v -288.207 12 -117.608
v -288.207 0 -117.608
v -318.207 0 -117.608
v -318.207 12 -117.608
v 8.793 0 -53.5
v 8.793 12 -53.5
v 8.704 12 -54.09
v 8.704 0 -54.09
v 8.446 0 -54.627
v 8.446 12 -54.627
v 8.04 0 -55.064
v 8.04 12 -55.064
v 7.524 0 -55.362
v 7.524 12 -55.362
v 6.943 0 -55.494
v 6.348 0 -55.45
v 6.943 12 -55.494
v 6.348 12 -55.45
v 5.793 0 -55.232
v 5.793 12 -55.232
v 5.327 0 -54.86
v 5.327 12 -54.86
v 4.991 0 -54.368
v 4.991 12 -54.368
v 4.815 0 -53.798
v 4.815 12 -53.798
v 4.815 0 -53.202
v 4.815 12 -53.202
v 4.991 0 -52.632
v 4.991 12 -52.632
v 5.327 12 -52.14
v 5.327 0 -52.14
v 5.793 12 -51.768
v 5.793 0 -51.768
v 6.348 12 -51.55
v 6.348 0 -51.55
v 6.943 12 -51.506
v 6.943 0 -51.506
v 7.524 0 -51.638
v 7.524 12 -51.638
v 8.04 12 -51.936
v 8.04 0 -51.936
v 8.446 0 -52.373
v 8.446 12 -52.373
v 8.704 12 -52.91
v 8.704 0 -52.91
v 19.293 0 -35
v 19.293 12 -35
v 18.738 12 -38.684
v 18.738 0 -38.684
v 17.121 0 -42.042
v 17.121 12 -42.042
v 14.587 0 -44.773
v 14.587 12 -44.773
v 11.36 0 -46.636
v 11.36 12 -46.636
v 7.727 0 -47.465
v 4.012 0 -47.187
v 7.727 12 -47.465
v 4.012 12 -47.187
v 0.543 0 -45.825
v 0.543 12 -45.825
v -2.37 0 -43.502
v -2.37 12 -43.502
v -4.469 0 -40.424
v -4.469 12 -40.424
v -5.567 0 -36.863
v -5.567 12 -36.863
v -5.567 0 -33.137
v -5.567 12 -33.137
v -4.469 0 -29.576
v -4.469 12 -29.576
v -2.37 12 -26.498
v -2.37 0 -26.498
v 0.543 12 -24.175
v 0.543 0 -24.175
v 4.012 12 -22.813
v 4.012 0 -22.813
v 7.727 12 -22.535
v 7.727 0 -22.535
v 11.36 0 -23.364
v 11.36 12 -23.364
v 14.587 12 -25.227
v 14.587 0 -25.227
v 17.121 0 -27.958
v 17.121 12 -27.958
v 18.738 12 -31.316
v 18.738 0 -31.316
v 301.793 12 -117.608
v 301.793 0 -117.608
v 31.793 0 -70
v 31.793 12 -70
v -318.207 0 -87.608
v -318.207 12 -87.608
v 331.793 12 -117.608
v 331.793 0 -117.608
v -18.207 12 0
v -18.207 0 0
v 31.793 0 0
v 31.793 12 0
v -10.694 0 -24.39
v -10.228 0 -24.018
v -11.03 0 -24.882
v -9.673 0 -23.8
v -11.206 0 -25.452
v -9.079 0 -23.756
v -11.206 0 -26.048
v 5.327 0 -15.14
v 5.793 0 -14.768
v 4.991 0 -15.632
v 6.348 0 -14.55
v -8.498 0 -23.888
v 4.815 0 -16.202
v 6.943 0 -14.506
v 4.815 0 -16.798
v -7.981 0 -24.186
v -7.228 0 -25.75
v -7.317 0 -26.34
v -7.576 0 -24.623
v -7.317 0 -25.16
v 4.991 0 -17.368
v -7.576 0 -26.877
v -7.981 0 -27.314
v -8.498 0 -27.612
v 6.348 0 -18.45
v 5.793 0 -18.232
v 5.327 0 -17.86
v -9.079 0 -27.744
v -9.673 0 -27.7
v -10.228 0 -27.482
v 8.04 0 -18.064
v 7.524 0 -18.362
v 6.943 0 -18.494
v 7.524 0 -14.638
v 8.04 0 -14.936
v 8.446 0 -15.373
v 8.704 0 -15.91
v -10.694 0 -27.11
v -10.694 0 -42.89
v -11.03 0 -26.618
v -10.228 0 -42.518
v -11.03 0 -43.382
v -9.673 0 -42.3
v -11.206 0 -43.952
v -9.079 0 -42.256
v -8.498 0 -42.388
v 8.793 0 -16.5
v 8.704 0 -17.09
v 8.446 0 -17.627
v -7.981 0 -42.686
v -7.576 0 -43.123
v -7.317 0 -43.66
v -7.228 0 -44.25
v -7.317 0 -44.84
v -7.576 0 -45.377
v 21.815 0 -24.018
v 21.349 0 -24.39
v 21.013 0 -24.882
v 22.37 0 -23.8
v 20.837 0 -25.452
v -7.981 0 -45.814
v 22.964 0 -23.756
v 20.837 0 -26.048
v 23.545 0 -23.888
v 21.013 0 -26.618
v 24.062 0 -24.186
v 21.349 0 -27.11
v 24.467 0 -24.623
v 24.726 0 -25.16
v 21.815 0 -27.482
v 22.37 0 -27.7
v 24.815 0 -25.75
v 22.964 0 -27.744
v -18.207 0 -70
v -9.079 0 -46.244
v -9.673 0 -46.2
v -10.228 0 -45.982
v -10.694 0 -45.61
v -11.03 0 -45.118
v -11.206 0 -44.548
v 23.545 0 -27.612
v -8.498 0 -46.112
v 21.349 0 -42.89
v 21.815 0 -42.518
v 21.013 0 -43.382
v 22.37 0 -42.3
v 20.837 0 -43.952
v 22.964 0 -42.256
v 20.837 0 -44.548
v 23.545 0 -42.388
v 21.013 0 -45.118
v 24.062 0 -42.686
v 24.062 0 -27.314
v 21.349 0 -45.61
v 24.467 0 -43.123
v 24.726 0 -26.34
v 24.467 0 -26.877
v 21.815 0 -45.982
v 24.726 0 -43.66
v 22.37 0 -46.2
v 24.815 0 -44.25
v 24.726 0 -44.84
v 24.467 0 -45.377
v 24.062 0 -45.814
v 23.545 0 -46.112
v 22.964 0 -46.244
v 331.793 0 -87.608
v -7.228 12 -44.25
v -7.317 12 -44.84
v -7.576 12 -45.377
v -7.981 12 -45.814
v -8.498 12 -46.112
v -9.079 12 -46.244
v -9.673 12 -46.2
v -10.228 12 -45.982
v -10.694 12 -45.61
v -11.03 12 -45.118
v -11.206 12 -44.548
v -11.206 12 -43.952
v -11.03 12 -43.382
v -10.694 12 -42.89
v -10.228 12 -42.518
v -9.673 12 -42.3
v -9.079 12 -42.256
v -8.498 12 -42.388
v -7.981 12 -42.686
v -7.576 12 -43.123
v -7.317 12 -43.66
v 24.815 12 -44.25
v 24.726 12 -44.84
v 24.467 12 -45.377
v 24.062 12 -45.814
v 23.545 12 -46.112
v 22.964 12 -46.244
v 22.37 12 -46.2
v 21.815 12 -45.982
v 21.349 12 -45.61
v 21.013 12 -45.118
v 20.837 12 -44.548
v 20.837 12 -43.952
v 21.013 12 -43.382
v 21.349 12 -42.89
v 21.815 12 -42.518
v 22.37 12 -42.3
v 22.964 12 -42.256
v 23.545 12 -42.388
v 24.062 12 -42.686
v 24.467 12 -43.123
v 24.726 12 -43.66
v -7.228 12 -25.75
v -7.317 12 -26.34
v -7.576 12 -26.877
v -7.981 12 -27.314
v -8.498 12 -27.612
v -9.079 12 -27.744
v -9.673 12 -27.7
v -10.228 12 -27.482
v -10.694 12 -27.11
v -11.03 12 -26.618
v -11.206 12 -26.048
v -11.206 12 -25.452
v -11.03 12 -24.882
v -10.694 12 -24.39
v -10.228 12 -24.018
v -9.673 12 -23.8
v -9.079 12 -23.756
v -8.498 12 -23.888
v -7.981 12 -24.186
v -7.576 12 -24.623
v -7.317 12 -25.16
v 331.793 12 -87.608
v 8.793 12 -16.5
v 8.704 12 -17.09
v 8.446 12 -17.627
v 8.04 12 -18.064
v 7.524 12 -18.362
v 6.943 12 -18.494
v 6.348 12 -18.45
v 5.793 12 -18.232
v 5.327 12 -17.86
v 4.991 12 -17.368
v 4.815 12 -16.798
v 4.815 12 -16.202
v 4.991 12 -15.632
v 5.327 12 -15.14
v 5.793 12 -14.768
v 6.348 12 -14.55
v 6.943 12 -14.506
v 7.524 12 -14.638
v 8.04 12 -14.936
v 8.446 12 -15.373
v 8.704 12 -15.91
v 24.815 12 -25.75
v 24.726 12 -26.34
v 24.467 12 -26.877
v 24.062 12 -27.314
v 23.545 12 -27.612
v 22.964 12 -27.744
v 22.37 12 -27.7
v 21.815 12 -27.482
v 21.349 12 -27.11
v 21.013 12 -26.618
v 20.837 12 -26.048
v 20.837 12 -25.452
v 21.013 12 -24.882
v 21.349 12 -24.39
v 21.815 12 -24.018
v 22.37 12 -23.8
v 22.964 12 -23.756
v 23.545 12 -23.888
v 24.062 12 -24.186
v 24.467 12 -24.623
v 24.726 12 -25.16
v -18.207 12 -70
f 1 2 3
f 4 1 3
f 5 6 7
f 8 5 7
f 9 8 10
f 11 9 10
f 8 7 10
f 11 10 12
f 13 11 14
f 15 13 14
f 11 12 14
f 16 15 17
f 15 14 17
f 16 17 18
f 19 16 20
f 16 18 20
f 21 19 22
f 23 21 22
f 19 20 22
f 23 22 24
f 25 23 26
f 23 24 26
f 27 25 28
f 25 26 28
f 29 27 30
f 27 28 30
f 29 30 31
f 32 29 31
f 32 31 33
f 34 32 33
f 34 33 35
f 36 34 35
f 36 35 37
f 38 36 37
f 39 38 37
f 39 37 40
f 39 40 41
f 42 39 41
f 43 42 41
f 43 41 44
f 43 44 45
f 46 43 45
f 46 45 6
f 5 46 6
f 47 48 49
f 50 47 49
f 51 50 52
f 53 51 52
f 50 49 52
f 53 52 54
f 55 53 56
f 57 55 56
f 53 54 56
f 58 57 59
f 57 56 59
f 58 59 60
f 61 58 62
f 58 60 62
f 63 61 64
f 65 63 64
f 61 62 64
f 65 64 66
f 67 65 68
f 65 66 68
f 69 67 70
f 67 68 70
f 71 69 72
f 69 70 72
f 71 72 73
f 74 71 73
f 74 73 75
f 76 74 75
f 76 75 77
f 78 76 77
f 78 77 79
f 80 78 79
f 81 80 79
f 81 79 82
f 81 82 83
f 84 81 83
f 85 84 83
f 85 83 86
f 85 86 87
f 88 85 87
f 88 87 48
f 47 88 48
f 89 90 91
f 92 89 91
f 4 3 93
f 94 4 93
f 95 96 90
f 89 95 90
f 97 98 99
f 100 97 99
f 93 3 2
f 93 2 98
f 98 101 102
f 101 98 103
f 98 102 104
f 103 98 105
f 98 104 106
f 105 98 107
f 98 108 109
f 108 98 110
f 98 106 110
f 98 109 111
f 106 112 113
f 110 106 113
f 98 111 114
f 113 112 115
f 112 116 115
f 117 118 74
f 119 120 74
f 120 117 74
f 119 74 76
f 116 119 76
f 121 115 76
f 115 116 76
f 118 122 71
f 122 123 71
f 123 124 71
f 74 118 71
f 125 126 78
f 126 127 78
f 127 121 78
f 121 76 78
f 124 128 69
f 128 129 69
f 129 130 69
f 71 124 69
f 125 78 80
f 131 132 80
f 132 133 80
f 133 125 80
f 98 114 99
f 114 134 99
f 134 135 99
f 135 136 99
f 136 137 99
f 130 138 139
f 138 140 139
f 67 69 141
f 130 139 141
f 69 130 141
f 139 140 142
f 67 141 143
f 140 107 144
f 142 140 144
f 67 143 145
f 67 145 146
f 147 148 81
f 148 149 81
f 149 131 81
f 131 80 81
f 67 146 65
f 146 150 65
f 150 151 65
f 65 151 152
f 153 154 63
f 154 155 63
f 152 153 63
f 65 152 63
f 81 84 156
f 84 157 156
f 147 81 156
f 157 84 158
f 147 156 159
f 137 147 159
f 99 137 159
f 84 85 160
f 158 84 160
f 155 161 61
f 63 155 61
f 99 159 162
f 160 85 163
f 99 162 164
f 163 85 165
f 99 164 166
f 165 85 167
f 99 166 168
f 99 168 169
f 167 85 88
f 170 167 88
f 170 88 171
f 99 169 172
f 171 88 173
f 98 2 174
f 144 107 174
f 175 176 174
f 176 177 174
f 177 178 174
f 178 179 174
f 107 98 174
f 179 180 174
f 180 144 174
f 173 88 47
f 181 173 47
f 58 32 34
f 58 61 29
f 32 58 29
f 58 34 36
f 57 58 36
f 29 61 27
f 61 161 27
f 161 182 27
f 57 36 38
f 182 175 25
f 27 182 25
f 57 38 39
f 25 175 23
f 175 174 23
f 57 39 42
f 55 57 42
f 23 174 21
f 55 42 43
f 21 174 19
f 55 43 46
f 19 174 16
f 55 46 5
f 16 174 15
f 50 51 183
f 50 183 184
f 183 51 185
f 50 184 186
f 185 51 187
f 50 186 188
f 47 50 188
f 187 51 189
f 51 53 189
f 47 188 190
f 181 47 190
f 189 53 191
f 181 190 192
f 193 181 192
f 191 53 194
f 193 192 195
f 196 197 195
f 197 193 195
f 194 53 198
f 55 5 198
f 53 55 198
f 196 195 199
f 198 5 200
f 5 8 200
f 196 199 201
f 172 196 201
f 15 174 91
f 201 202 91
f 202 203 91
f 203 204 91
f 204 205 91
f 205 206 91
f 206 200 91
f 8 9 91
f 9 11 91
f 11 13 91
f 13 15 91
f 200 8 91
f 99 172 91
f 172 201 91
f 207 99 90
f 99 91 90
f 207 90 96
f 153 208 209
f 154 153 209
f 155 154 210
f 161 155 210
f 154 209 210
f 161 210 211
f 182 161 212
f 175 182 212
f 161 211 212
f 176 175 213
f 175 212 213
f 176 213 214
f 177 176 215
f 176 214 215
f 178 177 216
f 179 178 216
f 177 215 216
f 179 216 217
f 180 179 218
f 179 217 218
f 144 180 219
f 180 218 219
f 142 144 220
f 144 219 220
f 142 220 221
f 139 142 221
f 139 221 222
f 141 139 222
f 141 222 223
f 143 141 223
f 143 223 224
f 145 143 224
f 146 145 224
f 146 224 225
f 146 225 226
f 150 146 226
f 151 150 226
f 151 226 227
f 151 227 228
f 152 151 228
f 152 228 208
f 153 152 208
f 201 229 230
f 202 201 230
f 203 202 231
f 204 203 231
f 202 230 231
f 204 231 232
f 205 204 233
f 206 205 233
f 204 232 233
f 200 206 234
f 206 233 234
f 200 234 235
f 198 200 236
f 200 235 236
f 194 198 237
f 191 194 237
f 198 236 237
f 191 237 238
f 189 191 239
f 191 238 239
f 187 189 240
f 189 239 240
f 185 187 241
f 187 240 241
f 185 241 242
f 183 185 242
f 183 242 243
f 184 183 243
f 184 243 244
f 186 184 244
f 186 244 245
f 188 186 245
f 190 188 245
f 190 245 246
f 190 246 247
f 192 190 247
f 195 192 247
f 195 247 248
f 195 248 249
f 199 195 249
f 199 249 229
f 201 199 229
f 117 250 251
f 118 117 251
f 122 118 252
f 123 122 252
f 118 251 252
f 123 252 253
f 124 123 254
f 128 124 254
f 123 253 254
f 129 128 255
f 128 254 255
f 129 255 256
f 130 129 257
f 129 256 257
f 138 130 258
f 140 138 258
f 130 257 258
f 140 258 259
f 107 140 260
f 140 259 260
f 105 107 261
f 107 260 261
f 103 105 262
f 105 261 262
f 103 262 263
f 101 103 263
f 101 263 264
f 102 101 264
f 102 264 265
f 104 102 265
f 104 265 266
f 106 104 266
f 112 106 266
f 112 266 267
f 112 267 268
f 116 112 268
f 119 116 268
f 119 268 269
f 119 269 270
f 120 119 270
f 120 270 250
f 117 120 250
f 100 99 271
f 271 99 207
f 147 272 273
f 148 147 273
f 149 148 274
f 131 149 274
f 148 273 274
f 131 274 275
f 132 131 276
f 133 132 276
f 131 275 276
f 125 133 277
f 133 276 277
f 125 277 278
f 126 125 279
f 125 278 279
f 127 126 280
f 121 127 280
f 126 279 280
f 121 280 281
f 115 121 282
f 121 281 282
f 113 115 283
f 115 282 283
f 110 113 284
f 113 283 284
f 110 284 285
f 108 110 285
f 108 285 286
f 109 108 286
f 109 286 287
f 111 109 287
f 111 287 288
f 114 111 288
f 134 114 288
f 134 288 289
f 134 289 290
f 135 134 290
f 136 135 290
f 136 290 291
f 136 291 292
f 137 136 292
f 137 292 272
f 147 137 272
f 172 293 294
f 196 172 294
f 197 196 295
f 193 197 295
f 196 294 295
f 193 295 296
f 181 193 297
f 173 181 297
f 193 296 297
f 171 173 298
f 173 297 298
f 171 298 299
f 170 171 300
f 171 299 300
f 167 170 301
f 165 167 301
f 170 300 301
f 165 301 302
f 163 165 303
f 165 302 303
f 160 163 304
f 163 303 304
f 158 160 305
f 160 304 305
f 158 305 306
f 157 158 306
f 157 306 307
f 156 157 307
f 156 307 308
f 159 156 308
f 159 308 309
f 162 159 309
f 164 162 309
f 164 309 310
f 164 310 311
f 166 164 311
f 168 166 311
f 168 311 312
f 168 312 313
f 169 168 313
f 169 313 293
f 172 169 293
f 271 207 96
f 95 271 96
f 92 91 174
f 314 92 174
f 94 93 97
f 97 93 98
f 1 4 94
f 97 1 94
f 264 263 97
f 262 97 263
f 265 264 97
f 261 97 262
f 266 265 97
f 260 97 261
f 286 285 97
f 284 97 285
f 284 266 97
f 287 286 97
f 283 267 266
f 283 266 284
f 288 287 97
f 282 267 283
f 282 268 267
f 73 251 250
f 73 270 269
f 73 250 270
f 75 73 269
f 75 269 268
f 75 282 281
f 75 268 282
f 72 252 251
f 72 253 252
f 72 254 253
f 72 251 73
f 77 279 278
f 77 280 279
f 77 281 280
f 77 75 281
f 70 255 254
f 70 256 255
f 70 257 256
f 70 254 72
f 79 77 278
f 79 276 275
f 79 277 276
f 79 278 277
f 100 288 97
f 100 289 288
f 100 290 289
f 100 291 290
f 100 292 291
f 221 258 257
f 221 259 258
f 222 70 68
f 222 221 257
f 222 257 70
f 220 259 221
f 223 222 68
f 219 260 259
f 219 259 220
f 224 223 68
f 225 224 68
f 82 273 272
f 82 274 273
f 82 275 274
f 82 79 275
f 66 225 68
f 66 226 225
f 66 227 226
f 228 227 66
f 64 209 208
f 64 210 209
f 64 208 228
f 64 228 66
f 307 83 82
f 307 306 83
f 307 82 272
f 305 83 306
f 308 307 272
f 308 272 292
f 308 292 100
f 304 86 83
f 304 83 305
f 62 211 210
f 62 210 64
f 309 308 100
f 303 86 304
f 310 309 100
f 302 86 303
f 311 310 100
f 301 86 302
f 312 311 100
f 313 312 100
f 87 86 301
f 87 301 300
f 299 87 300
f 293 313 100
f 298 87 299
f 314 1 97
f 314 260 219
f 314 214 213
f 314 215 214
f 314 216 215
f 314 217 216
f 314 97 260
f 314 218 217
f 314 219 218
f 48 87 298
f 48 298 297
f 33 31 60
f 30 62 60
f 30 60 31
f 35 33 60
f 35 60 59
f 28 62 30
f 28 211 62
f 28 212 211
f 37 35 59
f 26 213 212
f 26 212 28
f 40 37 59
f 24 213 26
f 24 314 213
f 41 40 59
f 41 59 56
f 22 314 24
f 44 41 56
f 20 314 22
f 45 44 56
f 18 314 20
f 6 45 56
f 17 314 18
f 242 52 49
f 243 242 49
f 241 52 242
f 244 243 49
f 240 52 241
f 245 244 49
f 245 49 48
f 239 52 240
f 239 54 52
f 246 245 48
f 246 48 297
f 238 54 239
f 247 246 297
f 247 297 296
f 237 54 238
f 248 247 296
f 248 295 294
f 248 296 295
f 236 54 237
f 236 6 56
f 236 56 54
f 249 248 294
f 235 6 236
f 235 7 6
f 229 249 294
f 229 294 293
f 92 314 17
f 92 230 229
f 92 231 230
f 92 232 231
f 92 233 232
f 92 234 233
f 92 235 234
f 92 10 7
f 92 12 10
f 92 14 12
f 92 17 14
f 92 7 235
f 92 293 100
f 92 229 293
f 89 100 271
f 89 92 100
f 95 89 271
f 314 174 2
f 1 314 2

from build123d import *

# Parameters (mm, degrees)
BOSS_EXTRUDE1_DEPTH = 12
SKETCH4_R           = 12.5
SKETCH4_R_2         = 2
CUT_EXTRUDE1_DEPTH  = 20


with BuildPart() as part:
    # Sketch2 → Boss-Extrude1 (new body)
    with BuildSketch(Plane(origin=(0, 0, 0), x_dir=(1, 0, 0), z_dir=(0, 1, 0))):
        Polygon((-318.206861599, 87.608284791), (-18.206861599, 0), (31.793138401, 0), (331.793138401, 87.608284791), (331.793138401, 117.608284791), (301.793138401, 117.608284791), (31.793138401, 70), (-18.206861599, 70), (-288.206861599, 117.608284791), (-318.206861599, 117.608284791), align=None)
    extrude(amount=BOSS_EXTRUDE1_DEPTH)

    # Sketch4 → Cut-Extrude1 (cut)
    with BuildSketch(Plane(origin=(0, 12, 0), x_dir=(1, 0, 0), z_dir=(0, 1, 0))):
        with Locations((6.793138401, 35)):
            Circle(SKETCH4_R)
        with Locations((6.793138401, 53.5)):
            Circle(SKETCH4_R_2)
        with Locations((22.814608371, 44.25)):
            Circle(SKETCH4_R_2)
        with Locations((22.814608371, 25.75)):
            Circle(SKETCH4_R_2)
        with Locations((6.793138401, 16.5)):
            Circle(SKETCH4_R_2)
        with Locations((-9.228331569, 25.75)):
            Circle(SKETCH4_R_2)
        with Locations((-9.228331569, 44.25)):
            Circle(SKETCH4_R_2)
    extrude(amount=-CUT_EXTRUDE1_DEPTH, mode=Mode.SUBTRACT)


solid = part.part
